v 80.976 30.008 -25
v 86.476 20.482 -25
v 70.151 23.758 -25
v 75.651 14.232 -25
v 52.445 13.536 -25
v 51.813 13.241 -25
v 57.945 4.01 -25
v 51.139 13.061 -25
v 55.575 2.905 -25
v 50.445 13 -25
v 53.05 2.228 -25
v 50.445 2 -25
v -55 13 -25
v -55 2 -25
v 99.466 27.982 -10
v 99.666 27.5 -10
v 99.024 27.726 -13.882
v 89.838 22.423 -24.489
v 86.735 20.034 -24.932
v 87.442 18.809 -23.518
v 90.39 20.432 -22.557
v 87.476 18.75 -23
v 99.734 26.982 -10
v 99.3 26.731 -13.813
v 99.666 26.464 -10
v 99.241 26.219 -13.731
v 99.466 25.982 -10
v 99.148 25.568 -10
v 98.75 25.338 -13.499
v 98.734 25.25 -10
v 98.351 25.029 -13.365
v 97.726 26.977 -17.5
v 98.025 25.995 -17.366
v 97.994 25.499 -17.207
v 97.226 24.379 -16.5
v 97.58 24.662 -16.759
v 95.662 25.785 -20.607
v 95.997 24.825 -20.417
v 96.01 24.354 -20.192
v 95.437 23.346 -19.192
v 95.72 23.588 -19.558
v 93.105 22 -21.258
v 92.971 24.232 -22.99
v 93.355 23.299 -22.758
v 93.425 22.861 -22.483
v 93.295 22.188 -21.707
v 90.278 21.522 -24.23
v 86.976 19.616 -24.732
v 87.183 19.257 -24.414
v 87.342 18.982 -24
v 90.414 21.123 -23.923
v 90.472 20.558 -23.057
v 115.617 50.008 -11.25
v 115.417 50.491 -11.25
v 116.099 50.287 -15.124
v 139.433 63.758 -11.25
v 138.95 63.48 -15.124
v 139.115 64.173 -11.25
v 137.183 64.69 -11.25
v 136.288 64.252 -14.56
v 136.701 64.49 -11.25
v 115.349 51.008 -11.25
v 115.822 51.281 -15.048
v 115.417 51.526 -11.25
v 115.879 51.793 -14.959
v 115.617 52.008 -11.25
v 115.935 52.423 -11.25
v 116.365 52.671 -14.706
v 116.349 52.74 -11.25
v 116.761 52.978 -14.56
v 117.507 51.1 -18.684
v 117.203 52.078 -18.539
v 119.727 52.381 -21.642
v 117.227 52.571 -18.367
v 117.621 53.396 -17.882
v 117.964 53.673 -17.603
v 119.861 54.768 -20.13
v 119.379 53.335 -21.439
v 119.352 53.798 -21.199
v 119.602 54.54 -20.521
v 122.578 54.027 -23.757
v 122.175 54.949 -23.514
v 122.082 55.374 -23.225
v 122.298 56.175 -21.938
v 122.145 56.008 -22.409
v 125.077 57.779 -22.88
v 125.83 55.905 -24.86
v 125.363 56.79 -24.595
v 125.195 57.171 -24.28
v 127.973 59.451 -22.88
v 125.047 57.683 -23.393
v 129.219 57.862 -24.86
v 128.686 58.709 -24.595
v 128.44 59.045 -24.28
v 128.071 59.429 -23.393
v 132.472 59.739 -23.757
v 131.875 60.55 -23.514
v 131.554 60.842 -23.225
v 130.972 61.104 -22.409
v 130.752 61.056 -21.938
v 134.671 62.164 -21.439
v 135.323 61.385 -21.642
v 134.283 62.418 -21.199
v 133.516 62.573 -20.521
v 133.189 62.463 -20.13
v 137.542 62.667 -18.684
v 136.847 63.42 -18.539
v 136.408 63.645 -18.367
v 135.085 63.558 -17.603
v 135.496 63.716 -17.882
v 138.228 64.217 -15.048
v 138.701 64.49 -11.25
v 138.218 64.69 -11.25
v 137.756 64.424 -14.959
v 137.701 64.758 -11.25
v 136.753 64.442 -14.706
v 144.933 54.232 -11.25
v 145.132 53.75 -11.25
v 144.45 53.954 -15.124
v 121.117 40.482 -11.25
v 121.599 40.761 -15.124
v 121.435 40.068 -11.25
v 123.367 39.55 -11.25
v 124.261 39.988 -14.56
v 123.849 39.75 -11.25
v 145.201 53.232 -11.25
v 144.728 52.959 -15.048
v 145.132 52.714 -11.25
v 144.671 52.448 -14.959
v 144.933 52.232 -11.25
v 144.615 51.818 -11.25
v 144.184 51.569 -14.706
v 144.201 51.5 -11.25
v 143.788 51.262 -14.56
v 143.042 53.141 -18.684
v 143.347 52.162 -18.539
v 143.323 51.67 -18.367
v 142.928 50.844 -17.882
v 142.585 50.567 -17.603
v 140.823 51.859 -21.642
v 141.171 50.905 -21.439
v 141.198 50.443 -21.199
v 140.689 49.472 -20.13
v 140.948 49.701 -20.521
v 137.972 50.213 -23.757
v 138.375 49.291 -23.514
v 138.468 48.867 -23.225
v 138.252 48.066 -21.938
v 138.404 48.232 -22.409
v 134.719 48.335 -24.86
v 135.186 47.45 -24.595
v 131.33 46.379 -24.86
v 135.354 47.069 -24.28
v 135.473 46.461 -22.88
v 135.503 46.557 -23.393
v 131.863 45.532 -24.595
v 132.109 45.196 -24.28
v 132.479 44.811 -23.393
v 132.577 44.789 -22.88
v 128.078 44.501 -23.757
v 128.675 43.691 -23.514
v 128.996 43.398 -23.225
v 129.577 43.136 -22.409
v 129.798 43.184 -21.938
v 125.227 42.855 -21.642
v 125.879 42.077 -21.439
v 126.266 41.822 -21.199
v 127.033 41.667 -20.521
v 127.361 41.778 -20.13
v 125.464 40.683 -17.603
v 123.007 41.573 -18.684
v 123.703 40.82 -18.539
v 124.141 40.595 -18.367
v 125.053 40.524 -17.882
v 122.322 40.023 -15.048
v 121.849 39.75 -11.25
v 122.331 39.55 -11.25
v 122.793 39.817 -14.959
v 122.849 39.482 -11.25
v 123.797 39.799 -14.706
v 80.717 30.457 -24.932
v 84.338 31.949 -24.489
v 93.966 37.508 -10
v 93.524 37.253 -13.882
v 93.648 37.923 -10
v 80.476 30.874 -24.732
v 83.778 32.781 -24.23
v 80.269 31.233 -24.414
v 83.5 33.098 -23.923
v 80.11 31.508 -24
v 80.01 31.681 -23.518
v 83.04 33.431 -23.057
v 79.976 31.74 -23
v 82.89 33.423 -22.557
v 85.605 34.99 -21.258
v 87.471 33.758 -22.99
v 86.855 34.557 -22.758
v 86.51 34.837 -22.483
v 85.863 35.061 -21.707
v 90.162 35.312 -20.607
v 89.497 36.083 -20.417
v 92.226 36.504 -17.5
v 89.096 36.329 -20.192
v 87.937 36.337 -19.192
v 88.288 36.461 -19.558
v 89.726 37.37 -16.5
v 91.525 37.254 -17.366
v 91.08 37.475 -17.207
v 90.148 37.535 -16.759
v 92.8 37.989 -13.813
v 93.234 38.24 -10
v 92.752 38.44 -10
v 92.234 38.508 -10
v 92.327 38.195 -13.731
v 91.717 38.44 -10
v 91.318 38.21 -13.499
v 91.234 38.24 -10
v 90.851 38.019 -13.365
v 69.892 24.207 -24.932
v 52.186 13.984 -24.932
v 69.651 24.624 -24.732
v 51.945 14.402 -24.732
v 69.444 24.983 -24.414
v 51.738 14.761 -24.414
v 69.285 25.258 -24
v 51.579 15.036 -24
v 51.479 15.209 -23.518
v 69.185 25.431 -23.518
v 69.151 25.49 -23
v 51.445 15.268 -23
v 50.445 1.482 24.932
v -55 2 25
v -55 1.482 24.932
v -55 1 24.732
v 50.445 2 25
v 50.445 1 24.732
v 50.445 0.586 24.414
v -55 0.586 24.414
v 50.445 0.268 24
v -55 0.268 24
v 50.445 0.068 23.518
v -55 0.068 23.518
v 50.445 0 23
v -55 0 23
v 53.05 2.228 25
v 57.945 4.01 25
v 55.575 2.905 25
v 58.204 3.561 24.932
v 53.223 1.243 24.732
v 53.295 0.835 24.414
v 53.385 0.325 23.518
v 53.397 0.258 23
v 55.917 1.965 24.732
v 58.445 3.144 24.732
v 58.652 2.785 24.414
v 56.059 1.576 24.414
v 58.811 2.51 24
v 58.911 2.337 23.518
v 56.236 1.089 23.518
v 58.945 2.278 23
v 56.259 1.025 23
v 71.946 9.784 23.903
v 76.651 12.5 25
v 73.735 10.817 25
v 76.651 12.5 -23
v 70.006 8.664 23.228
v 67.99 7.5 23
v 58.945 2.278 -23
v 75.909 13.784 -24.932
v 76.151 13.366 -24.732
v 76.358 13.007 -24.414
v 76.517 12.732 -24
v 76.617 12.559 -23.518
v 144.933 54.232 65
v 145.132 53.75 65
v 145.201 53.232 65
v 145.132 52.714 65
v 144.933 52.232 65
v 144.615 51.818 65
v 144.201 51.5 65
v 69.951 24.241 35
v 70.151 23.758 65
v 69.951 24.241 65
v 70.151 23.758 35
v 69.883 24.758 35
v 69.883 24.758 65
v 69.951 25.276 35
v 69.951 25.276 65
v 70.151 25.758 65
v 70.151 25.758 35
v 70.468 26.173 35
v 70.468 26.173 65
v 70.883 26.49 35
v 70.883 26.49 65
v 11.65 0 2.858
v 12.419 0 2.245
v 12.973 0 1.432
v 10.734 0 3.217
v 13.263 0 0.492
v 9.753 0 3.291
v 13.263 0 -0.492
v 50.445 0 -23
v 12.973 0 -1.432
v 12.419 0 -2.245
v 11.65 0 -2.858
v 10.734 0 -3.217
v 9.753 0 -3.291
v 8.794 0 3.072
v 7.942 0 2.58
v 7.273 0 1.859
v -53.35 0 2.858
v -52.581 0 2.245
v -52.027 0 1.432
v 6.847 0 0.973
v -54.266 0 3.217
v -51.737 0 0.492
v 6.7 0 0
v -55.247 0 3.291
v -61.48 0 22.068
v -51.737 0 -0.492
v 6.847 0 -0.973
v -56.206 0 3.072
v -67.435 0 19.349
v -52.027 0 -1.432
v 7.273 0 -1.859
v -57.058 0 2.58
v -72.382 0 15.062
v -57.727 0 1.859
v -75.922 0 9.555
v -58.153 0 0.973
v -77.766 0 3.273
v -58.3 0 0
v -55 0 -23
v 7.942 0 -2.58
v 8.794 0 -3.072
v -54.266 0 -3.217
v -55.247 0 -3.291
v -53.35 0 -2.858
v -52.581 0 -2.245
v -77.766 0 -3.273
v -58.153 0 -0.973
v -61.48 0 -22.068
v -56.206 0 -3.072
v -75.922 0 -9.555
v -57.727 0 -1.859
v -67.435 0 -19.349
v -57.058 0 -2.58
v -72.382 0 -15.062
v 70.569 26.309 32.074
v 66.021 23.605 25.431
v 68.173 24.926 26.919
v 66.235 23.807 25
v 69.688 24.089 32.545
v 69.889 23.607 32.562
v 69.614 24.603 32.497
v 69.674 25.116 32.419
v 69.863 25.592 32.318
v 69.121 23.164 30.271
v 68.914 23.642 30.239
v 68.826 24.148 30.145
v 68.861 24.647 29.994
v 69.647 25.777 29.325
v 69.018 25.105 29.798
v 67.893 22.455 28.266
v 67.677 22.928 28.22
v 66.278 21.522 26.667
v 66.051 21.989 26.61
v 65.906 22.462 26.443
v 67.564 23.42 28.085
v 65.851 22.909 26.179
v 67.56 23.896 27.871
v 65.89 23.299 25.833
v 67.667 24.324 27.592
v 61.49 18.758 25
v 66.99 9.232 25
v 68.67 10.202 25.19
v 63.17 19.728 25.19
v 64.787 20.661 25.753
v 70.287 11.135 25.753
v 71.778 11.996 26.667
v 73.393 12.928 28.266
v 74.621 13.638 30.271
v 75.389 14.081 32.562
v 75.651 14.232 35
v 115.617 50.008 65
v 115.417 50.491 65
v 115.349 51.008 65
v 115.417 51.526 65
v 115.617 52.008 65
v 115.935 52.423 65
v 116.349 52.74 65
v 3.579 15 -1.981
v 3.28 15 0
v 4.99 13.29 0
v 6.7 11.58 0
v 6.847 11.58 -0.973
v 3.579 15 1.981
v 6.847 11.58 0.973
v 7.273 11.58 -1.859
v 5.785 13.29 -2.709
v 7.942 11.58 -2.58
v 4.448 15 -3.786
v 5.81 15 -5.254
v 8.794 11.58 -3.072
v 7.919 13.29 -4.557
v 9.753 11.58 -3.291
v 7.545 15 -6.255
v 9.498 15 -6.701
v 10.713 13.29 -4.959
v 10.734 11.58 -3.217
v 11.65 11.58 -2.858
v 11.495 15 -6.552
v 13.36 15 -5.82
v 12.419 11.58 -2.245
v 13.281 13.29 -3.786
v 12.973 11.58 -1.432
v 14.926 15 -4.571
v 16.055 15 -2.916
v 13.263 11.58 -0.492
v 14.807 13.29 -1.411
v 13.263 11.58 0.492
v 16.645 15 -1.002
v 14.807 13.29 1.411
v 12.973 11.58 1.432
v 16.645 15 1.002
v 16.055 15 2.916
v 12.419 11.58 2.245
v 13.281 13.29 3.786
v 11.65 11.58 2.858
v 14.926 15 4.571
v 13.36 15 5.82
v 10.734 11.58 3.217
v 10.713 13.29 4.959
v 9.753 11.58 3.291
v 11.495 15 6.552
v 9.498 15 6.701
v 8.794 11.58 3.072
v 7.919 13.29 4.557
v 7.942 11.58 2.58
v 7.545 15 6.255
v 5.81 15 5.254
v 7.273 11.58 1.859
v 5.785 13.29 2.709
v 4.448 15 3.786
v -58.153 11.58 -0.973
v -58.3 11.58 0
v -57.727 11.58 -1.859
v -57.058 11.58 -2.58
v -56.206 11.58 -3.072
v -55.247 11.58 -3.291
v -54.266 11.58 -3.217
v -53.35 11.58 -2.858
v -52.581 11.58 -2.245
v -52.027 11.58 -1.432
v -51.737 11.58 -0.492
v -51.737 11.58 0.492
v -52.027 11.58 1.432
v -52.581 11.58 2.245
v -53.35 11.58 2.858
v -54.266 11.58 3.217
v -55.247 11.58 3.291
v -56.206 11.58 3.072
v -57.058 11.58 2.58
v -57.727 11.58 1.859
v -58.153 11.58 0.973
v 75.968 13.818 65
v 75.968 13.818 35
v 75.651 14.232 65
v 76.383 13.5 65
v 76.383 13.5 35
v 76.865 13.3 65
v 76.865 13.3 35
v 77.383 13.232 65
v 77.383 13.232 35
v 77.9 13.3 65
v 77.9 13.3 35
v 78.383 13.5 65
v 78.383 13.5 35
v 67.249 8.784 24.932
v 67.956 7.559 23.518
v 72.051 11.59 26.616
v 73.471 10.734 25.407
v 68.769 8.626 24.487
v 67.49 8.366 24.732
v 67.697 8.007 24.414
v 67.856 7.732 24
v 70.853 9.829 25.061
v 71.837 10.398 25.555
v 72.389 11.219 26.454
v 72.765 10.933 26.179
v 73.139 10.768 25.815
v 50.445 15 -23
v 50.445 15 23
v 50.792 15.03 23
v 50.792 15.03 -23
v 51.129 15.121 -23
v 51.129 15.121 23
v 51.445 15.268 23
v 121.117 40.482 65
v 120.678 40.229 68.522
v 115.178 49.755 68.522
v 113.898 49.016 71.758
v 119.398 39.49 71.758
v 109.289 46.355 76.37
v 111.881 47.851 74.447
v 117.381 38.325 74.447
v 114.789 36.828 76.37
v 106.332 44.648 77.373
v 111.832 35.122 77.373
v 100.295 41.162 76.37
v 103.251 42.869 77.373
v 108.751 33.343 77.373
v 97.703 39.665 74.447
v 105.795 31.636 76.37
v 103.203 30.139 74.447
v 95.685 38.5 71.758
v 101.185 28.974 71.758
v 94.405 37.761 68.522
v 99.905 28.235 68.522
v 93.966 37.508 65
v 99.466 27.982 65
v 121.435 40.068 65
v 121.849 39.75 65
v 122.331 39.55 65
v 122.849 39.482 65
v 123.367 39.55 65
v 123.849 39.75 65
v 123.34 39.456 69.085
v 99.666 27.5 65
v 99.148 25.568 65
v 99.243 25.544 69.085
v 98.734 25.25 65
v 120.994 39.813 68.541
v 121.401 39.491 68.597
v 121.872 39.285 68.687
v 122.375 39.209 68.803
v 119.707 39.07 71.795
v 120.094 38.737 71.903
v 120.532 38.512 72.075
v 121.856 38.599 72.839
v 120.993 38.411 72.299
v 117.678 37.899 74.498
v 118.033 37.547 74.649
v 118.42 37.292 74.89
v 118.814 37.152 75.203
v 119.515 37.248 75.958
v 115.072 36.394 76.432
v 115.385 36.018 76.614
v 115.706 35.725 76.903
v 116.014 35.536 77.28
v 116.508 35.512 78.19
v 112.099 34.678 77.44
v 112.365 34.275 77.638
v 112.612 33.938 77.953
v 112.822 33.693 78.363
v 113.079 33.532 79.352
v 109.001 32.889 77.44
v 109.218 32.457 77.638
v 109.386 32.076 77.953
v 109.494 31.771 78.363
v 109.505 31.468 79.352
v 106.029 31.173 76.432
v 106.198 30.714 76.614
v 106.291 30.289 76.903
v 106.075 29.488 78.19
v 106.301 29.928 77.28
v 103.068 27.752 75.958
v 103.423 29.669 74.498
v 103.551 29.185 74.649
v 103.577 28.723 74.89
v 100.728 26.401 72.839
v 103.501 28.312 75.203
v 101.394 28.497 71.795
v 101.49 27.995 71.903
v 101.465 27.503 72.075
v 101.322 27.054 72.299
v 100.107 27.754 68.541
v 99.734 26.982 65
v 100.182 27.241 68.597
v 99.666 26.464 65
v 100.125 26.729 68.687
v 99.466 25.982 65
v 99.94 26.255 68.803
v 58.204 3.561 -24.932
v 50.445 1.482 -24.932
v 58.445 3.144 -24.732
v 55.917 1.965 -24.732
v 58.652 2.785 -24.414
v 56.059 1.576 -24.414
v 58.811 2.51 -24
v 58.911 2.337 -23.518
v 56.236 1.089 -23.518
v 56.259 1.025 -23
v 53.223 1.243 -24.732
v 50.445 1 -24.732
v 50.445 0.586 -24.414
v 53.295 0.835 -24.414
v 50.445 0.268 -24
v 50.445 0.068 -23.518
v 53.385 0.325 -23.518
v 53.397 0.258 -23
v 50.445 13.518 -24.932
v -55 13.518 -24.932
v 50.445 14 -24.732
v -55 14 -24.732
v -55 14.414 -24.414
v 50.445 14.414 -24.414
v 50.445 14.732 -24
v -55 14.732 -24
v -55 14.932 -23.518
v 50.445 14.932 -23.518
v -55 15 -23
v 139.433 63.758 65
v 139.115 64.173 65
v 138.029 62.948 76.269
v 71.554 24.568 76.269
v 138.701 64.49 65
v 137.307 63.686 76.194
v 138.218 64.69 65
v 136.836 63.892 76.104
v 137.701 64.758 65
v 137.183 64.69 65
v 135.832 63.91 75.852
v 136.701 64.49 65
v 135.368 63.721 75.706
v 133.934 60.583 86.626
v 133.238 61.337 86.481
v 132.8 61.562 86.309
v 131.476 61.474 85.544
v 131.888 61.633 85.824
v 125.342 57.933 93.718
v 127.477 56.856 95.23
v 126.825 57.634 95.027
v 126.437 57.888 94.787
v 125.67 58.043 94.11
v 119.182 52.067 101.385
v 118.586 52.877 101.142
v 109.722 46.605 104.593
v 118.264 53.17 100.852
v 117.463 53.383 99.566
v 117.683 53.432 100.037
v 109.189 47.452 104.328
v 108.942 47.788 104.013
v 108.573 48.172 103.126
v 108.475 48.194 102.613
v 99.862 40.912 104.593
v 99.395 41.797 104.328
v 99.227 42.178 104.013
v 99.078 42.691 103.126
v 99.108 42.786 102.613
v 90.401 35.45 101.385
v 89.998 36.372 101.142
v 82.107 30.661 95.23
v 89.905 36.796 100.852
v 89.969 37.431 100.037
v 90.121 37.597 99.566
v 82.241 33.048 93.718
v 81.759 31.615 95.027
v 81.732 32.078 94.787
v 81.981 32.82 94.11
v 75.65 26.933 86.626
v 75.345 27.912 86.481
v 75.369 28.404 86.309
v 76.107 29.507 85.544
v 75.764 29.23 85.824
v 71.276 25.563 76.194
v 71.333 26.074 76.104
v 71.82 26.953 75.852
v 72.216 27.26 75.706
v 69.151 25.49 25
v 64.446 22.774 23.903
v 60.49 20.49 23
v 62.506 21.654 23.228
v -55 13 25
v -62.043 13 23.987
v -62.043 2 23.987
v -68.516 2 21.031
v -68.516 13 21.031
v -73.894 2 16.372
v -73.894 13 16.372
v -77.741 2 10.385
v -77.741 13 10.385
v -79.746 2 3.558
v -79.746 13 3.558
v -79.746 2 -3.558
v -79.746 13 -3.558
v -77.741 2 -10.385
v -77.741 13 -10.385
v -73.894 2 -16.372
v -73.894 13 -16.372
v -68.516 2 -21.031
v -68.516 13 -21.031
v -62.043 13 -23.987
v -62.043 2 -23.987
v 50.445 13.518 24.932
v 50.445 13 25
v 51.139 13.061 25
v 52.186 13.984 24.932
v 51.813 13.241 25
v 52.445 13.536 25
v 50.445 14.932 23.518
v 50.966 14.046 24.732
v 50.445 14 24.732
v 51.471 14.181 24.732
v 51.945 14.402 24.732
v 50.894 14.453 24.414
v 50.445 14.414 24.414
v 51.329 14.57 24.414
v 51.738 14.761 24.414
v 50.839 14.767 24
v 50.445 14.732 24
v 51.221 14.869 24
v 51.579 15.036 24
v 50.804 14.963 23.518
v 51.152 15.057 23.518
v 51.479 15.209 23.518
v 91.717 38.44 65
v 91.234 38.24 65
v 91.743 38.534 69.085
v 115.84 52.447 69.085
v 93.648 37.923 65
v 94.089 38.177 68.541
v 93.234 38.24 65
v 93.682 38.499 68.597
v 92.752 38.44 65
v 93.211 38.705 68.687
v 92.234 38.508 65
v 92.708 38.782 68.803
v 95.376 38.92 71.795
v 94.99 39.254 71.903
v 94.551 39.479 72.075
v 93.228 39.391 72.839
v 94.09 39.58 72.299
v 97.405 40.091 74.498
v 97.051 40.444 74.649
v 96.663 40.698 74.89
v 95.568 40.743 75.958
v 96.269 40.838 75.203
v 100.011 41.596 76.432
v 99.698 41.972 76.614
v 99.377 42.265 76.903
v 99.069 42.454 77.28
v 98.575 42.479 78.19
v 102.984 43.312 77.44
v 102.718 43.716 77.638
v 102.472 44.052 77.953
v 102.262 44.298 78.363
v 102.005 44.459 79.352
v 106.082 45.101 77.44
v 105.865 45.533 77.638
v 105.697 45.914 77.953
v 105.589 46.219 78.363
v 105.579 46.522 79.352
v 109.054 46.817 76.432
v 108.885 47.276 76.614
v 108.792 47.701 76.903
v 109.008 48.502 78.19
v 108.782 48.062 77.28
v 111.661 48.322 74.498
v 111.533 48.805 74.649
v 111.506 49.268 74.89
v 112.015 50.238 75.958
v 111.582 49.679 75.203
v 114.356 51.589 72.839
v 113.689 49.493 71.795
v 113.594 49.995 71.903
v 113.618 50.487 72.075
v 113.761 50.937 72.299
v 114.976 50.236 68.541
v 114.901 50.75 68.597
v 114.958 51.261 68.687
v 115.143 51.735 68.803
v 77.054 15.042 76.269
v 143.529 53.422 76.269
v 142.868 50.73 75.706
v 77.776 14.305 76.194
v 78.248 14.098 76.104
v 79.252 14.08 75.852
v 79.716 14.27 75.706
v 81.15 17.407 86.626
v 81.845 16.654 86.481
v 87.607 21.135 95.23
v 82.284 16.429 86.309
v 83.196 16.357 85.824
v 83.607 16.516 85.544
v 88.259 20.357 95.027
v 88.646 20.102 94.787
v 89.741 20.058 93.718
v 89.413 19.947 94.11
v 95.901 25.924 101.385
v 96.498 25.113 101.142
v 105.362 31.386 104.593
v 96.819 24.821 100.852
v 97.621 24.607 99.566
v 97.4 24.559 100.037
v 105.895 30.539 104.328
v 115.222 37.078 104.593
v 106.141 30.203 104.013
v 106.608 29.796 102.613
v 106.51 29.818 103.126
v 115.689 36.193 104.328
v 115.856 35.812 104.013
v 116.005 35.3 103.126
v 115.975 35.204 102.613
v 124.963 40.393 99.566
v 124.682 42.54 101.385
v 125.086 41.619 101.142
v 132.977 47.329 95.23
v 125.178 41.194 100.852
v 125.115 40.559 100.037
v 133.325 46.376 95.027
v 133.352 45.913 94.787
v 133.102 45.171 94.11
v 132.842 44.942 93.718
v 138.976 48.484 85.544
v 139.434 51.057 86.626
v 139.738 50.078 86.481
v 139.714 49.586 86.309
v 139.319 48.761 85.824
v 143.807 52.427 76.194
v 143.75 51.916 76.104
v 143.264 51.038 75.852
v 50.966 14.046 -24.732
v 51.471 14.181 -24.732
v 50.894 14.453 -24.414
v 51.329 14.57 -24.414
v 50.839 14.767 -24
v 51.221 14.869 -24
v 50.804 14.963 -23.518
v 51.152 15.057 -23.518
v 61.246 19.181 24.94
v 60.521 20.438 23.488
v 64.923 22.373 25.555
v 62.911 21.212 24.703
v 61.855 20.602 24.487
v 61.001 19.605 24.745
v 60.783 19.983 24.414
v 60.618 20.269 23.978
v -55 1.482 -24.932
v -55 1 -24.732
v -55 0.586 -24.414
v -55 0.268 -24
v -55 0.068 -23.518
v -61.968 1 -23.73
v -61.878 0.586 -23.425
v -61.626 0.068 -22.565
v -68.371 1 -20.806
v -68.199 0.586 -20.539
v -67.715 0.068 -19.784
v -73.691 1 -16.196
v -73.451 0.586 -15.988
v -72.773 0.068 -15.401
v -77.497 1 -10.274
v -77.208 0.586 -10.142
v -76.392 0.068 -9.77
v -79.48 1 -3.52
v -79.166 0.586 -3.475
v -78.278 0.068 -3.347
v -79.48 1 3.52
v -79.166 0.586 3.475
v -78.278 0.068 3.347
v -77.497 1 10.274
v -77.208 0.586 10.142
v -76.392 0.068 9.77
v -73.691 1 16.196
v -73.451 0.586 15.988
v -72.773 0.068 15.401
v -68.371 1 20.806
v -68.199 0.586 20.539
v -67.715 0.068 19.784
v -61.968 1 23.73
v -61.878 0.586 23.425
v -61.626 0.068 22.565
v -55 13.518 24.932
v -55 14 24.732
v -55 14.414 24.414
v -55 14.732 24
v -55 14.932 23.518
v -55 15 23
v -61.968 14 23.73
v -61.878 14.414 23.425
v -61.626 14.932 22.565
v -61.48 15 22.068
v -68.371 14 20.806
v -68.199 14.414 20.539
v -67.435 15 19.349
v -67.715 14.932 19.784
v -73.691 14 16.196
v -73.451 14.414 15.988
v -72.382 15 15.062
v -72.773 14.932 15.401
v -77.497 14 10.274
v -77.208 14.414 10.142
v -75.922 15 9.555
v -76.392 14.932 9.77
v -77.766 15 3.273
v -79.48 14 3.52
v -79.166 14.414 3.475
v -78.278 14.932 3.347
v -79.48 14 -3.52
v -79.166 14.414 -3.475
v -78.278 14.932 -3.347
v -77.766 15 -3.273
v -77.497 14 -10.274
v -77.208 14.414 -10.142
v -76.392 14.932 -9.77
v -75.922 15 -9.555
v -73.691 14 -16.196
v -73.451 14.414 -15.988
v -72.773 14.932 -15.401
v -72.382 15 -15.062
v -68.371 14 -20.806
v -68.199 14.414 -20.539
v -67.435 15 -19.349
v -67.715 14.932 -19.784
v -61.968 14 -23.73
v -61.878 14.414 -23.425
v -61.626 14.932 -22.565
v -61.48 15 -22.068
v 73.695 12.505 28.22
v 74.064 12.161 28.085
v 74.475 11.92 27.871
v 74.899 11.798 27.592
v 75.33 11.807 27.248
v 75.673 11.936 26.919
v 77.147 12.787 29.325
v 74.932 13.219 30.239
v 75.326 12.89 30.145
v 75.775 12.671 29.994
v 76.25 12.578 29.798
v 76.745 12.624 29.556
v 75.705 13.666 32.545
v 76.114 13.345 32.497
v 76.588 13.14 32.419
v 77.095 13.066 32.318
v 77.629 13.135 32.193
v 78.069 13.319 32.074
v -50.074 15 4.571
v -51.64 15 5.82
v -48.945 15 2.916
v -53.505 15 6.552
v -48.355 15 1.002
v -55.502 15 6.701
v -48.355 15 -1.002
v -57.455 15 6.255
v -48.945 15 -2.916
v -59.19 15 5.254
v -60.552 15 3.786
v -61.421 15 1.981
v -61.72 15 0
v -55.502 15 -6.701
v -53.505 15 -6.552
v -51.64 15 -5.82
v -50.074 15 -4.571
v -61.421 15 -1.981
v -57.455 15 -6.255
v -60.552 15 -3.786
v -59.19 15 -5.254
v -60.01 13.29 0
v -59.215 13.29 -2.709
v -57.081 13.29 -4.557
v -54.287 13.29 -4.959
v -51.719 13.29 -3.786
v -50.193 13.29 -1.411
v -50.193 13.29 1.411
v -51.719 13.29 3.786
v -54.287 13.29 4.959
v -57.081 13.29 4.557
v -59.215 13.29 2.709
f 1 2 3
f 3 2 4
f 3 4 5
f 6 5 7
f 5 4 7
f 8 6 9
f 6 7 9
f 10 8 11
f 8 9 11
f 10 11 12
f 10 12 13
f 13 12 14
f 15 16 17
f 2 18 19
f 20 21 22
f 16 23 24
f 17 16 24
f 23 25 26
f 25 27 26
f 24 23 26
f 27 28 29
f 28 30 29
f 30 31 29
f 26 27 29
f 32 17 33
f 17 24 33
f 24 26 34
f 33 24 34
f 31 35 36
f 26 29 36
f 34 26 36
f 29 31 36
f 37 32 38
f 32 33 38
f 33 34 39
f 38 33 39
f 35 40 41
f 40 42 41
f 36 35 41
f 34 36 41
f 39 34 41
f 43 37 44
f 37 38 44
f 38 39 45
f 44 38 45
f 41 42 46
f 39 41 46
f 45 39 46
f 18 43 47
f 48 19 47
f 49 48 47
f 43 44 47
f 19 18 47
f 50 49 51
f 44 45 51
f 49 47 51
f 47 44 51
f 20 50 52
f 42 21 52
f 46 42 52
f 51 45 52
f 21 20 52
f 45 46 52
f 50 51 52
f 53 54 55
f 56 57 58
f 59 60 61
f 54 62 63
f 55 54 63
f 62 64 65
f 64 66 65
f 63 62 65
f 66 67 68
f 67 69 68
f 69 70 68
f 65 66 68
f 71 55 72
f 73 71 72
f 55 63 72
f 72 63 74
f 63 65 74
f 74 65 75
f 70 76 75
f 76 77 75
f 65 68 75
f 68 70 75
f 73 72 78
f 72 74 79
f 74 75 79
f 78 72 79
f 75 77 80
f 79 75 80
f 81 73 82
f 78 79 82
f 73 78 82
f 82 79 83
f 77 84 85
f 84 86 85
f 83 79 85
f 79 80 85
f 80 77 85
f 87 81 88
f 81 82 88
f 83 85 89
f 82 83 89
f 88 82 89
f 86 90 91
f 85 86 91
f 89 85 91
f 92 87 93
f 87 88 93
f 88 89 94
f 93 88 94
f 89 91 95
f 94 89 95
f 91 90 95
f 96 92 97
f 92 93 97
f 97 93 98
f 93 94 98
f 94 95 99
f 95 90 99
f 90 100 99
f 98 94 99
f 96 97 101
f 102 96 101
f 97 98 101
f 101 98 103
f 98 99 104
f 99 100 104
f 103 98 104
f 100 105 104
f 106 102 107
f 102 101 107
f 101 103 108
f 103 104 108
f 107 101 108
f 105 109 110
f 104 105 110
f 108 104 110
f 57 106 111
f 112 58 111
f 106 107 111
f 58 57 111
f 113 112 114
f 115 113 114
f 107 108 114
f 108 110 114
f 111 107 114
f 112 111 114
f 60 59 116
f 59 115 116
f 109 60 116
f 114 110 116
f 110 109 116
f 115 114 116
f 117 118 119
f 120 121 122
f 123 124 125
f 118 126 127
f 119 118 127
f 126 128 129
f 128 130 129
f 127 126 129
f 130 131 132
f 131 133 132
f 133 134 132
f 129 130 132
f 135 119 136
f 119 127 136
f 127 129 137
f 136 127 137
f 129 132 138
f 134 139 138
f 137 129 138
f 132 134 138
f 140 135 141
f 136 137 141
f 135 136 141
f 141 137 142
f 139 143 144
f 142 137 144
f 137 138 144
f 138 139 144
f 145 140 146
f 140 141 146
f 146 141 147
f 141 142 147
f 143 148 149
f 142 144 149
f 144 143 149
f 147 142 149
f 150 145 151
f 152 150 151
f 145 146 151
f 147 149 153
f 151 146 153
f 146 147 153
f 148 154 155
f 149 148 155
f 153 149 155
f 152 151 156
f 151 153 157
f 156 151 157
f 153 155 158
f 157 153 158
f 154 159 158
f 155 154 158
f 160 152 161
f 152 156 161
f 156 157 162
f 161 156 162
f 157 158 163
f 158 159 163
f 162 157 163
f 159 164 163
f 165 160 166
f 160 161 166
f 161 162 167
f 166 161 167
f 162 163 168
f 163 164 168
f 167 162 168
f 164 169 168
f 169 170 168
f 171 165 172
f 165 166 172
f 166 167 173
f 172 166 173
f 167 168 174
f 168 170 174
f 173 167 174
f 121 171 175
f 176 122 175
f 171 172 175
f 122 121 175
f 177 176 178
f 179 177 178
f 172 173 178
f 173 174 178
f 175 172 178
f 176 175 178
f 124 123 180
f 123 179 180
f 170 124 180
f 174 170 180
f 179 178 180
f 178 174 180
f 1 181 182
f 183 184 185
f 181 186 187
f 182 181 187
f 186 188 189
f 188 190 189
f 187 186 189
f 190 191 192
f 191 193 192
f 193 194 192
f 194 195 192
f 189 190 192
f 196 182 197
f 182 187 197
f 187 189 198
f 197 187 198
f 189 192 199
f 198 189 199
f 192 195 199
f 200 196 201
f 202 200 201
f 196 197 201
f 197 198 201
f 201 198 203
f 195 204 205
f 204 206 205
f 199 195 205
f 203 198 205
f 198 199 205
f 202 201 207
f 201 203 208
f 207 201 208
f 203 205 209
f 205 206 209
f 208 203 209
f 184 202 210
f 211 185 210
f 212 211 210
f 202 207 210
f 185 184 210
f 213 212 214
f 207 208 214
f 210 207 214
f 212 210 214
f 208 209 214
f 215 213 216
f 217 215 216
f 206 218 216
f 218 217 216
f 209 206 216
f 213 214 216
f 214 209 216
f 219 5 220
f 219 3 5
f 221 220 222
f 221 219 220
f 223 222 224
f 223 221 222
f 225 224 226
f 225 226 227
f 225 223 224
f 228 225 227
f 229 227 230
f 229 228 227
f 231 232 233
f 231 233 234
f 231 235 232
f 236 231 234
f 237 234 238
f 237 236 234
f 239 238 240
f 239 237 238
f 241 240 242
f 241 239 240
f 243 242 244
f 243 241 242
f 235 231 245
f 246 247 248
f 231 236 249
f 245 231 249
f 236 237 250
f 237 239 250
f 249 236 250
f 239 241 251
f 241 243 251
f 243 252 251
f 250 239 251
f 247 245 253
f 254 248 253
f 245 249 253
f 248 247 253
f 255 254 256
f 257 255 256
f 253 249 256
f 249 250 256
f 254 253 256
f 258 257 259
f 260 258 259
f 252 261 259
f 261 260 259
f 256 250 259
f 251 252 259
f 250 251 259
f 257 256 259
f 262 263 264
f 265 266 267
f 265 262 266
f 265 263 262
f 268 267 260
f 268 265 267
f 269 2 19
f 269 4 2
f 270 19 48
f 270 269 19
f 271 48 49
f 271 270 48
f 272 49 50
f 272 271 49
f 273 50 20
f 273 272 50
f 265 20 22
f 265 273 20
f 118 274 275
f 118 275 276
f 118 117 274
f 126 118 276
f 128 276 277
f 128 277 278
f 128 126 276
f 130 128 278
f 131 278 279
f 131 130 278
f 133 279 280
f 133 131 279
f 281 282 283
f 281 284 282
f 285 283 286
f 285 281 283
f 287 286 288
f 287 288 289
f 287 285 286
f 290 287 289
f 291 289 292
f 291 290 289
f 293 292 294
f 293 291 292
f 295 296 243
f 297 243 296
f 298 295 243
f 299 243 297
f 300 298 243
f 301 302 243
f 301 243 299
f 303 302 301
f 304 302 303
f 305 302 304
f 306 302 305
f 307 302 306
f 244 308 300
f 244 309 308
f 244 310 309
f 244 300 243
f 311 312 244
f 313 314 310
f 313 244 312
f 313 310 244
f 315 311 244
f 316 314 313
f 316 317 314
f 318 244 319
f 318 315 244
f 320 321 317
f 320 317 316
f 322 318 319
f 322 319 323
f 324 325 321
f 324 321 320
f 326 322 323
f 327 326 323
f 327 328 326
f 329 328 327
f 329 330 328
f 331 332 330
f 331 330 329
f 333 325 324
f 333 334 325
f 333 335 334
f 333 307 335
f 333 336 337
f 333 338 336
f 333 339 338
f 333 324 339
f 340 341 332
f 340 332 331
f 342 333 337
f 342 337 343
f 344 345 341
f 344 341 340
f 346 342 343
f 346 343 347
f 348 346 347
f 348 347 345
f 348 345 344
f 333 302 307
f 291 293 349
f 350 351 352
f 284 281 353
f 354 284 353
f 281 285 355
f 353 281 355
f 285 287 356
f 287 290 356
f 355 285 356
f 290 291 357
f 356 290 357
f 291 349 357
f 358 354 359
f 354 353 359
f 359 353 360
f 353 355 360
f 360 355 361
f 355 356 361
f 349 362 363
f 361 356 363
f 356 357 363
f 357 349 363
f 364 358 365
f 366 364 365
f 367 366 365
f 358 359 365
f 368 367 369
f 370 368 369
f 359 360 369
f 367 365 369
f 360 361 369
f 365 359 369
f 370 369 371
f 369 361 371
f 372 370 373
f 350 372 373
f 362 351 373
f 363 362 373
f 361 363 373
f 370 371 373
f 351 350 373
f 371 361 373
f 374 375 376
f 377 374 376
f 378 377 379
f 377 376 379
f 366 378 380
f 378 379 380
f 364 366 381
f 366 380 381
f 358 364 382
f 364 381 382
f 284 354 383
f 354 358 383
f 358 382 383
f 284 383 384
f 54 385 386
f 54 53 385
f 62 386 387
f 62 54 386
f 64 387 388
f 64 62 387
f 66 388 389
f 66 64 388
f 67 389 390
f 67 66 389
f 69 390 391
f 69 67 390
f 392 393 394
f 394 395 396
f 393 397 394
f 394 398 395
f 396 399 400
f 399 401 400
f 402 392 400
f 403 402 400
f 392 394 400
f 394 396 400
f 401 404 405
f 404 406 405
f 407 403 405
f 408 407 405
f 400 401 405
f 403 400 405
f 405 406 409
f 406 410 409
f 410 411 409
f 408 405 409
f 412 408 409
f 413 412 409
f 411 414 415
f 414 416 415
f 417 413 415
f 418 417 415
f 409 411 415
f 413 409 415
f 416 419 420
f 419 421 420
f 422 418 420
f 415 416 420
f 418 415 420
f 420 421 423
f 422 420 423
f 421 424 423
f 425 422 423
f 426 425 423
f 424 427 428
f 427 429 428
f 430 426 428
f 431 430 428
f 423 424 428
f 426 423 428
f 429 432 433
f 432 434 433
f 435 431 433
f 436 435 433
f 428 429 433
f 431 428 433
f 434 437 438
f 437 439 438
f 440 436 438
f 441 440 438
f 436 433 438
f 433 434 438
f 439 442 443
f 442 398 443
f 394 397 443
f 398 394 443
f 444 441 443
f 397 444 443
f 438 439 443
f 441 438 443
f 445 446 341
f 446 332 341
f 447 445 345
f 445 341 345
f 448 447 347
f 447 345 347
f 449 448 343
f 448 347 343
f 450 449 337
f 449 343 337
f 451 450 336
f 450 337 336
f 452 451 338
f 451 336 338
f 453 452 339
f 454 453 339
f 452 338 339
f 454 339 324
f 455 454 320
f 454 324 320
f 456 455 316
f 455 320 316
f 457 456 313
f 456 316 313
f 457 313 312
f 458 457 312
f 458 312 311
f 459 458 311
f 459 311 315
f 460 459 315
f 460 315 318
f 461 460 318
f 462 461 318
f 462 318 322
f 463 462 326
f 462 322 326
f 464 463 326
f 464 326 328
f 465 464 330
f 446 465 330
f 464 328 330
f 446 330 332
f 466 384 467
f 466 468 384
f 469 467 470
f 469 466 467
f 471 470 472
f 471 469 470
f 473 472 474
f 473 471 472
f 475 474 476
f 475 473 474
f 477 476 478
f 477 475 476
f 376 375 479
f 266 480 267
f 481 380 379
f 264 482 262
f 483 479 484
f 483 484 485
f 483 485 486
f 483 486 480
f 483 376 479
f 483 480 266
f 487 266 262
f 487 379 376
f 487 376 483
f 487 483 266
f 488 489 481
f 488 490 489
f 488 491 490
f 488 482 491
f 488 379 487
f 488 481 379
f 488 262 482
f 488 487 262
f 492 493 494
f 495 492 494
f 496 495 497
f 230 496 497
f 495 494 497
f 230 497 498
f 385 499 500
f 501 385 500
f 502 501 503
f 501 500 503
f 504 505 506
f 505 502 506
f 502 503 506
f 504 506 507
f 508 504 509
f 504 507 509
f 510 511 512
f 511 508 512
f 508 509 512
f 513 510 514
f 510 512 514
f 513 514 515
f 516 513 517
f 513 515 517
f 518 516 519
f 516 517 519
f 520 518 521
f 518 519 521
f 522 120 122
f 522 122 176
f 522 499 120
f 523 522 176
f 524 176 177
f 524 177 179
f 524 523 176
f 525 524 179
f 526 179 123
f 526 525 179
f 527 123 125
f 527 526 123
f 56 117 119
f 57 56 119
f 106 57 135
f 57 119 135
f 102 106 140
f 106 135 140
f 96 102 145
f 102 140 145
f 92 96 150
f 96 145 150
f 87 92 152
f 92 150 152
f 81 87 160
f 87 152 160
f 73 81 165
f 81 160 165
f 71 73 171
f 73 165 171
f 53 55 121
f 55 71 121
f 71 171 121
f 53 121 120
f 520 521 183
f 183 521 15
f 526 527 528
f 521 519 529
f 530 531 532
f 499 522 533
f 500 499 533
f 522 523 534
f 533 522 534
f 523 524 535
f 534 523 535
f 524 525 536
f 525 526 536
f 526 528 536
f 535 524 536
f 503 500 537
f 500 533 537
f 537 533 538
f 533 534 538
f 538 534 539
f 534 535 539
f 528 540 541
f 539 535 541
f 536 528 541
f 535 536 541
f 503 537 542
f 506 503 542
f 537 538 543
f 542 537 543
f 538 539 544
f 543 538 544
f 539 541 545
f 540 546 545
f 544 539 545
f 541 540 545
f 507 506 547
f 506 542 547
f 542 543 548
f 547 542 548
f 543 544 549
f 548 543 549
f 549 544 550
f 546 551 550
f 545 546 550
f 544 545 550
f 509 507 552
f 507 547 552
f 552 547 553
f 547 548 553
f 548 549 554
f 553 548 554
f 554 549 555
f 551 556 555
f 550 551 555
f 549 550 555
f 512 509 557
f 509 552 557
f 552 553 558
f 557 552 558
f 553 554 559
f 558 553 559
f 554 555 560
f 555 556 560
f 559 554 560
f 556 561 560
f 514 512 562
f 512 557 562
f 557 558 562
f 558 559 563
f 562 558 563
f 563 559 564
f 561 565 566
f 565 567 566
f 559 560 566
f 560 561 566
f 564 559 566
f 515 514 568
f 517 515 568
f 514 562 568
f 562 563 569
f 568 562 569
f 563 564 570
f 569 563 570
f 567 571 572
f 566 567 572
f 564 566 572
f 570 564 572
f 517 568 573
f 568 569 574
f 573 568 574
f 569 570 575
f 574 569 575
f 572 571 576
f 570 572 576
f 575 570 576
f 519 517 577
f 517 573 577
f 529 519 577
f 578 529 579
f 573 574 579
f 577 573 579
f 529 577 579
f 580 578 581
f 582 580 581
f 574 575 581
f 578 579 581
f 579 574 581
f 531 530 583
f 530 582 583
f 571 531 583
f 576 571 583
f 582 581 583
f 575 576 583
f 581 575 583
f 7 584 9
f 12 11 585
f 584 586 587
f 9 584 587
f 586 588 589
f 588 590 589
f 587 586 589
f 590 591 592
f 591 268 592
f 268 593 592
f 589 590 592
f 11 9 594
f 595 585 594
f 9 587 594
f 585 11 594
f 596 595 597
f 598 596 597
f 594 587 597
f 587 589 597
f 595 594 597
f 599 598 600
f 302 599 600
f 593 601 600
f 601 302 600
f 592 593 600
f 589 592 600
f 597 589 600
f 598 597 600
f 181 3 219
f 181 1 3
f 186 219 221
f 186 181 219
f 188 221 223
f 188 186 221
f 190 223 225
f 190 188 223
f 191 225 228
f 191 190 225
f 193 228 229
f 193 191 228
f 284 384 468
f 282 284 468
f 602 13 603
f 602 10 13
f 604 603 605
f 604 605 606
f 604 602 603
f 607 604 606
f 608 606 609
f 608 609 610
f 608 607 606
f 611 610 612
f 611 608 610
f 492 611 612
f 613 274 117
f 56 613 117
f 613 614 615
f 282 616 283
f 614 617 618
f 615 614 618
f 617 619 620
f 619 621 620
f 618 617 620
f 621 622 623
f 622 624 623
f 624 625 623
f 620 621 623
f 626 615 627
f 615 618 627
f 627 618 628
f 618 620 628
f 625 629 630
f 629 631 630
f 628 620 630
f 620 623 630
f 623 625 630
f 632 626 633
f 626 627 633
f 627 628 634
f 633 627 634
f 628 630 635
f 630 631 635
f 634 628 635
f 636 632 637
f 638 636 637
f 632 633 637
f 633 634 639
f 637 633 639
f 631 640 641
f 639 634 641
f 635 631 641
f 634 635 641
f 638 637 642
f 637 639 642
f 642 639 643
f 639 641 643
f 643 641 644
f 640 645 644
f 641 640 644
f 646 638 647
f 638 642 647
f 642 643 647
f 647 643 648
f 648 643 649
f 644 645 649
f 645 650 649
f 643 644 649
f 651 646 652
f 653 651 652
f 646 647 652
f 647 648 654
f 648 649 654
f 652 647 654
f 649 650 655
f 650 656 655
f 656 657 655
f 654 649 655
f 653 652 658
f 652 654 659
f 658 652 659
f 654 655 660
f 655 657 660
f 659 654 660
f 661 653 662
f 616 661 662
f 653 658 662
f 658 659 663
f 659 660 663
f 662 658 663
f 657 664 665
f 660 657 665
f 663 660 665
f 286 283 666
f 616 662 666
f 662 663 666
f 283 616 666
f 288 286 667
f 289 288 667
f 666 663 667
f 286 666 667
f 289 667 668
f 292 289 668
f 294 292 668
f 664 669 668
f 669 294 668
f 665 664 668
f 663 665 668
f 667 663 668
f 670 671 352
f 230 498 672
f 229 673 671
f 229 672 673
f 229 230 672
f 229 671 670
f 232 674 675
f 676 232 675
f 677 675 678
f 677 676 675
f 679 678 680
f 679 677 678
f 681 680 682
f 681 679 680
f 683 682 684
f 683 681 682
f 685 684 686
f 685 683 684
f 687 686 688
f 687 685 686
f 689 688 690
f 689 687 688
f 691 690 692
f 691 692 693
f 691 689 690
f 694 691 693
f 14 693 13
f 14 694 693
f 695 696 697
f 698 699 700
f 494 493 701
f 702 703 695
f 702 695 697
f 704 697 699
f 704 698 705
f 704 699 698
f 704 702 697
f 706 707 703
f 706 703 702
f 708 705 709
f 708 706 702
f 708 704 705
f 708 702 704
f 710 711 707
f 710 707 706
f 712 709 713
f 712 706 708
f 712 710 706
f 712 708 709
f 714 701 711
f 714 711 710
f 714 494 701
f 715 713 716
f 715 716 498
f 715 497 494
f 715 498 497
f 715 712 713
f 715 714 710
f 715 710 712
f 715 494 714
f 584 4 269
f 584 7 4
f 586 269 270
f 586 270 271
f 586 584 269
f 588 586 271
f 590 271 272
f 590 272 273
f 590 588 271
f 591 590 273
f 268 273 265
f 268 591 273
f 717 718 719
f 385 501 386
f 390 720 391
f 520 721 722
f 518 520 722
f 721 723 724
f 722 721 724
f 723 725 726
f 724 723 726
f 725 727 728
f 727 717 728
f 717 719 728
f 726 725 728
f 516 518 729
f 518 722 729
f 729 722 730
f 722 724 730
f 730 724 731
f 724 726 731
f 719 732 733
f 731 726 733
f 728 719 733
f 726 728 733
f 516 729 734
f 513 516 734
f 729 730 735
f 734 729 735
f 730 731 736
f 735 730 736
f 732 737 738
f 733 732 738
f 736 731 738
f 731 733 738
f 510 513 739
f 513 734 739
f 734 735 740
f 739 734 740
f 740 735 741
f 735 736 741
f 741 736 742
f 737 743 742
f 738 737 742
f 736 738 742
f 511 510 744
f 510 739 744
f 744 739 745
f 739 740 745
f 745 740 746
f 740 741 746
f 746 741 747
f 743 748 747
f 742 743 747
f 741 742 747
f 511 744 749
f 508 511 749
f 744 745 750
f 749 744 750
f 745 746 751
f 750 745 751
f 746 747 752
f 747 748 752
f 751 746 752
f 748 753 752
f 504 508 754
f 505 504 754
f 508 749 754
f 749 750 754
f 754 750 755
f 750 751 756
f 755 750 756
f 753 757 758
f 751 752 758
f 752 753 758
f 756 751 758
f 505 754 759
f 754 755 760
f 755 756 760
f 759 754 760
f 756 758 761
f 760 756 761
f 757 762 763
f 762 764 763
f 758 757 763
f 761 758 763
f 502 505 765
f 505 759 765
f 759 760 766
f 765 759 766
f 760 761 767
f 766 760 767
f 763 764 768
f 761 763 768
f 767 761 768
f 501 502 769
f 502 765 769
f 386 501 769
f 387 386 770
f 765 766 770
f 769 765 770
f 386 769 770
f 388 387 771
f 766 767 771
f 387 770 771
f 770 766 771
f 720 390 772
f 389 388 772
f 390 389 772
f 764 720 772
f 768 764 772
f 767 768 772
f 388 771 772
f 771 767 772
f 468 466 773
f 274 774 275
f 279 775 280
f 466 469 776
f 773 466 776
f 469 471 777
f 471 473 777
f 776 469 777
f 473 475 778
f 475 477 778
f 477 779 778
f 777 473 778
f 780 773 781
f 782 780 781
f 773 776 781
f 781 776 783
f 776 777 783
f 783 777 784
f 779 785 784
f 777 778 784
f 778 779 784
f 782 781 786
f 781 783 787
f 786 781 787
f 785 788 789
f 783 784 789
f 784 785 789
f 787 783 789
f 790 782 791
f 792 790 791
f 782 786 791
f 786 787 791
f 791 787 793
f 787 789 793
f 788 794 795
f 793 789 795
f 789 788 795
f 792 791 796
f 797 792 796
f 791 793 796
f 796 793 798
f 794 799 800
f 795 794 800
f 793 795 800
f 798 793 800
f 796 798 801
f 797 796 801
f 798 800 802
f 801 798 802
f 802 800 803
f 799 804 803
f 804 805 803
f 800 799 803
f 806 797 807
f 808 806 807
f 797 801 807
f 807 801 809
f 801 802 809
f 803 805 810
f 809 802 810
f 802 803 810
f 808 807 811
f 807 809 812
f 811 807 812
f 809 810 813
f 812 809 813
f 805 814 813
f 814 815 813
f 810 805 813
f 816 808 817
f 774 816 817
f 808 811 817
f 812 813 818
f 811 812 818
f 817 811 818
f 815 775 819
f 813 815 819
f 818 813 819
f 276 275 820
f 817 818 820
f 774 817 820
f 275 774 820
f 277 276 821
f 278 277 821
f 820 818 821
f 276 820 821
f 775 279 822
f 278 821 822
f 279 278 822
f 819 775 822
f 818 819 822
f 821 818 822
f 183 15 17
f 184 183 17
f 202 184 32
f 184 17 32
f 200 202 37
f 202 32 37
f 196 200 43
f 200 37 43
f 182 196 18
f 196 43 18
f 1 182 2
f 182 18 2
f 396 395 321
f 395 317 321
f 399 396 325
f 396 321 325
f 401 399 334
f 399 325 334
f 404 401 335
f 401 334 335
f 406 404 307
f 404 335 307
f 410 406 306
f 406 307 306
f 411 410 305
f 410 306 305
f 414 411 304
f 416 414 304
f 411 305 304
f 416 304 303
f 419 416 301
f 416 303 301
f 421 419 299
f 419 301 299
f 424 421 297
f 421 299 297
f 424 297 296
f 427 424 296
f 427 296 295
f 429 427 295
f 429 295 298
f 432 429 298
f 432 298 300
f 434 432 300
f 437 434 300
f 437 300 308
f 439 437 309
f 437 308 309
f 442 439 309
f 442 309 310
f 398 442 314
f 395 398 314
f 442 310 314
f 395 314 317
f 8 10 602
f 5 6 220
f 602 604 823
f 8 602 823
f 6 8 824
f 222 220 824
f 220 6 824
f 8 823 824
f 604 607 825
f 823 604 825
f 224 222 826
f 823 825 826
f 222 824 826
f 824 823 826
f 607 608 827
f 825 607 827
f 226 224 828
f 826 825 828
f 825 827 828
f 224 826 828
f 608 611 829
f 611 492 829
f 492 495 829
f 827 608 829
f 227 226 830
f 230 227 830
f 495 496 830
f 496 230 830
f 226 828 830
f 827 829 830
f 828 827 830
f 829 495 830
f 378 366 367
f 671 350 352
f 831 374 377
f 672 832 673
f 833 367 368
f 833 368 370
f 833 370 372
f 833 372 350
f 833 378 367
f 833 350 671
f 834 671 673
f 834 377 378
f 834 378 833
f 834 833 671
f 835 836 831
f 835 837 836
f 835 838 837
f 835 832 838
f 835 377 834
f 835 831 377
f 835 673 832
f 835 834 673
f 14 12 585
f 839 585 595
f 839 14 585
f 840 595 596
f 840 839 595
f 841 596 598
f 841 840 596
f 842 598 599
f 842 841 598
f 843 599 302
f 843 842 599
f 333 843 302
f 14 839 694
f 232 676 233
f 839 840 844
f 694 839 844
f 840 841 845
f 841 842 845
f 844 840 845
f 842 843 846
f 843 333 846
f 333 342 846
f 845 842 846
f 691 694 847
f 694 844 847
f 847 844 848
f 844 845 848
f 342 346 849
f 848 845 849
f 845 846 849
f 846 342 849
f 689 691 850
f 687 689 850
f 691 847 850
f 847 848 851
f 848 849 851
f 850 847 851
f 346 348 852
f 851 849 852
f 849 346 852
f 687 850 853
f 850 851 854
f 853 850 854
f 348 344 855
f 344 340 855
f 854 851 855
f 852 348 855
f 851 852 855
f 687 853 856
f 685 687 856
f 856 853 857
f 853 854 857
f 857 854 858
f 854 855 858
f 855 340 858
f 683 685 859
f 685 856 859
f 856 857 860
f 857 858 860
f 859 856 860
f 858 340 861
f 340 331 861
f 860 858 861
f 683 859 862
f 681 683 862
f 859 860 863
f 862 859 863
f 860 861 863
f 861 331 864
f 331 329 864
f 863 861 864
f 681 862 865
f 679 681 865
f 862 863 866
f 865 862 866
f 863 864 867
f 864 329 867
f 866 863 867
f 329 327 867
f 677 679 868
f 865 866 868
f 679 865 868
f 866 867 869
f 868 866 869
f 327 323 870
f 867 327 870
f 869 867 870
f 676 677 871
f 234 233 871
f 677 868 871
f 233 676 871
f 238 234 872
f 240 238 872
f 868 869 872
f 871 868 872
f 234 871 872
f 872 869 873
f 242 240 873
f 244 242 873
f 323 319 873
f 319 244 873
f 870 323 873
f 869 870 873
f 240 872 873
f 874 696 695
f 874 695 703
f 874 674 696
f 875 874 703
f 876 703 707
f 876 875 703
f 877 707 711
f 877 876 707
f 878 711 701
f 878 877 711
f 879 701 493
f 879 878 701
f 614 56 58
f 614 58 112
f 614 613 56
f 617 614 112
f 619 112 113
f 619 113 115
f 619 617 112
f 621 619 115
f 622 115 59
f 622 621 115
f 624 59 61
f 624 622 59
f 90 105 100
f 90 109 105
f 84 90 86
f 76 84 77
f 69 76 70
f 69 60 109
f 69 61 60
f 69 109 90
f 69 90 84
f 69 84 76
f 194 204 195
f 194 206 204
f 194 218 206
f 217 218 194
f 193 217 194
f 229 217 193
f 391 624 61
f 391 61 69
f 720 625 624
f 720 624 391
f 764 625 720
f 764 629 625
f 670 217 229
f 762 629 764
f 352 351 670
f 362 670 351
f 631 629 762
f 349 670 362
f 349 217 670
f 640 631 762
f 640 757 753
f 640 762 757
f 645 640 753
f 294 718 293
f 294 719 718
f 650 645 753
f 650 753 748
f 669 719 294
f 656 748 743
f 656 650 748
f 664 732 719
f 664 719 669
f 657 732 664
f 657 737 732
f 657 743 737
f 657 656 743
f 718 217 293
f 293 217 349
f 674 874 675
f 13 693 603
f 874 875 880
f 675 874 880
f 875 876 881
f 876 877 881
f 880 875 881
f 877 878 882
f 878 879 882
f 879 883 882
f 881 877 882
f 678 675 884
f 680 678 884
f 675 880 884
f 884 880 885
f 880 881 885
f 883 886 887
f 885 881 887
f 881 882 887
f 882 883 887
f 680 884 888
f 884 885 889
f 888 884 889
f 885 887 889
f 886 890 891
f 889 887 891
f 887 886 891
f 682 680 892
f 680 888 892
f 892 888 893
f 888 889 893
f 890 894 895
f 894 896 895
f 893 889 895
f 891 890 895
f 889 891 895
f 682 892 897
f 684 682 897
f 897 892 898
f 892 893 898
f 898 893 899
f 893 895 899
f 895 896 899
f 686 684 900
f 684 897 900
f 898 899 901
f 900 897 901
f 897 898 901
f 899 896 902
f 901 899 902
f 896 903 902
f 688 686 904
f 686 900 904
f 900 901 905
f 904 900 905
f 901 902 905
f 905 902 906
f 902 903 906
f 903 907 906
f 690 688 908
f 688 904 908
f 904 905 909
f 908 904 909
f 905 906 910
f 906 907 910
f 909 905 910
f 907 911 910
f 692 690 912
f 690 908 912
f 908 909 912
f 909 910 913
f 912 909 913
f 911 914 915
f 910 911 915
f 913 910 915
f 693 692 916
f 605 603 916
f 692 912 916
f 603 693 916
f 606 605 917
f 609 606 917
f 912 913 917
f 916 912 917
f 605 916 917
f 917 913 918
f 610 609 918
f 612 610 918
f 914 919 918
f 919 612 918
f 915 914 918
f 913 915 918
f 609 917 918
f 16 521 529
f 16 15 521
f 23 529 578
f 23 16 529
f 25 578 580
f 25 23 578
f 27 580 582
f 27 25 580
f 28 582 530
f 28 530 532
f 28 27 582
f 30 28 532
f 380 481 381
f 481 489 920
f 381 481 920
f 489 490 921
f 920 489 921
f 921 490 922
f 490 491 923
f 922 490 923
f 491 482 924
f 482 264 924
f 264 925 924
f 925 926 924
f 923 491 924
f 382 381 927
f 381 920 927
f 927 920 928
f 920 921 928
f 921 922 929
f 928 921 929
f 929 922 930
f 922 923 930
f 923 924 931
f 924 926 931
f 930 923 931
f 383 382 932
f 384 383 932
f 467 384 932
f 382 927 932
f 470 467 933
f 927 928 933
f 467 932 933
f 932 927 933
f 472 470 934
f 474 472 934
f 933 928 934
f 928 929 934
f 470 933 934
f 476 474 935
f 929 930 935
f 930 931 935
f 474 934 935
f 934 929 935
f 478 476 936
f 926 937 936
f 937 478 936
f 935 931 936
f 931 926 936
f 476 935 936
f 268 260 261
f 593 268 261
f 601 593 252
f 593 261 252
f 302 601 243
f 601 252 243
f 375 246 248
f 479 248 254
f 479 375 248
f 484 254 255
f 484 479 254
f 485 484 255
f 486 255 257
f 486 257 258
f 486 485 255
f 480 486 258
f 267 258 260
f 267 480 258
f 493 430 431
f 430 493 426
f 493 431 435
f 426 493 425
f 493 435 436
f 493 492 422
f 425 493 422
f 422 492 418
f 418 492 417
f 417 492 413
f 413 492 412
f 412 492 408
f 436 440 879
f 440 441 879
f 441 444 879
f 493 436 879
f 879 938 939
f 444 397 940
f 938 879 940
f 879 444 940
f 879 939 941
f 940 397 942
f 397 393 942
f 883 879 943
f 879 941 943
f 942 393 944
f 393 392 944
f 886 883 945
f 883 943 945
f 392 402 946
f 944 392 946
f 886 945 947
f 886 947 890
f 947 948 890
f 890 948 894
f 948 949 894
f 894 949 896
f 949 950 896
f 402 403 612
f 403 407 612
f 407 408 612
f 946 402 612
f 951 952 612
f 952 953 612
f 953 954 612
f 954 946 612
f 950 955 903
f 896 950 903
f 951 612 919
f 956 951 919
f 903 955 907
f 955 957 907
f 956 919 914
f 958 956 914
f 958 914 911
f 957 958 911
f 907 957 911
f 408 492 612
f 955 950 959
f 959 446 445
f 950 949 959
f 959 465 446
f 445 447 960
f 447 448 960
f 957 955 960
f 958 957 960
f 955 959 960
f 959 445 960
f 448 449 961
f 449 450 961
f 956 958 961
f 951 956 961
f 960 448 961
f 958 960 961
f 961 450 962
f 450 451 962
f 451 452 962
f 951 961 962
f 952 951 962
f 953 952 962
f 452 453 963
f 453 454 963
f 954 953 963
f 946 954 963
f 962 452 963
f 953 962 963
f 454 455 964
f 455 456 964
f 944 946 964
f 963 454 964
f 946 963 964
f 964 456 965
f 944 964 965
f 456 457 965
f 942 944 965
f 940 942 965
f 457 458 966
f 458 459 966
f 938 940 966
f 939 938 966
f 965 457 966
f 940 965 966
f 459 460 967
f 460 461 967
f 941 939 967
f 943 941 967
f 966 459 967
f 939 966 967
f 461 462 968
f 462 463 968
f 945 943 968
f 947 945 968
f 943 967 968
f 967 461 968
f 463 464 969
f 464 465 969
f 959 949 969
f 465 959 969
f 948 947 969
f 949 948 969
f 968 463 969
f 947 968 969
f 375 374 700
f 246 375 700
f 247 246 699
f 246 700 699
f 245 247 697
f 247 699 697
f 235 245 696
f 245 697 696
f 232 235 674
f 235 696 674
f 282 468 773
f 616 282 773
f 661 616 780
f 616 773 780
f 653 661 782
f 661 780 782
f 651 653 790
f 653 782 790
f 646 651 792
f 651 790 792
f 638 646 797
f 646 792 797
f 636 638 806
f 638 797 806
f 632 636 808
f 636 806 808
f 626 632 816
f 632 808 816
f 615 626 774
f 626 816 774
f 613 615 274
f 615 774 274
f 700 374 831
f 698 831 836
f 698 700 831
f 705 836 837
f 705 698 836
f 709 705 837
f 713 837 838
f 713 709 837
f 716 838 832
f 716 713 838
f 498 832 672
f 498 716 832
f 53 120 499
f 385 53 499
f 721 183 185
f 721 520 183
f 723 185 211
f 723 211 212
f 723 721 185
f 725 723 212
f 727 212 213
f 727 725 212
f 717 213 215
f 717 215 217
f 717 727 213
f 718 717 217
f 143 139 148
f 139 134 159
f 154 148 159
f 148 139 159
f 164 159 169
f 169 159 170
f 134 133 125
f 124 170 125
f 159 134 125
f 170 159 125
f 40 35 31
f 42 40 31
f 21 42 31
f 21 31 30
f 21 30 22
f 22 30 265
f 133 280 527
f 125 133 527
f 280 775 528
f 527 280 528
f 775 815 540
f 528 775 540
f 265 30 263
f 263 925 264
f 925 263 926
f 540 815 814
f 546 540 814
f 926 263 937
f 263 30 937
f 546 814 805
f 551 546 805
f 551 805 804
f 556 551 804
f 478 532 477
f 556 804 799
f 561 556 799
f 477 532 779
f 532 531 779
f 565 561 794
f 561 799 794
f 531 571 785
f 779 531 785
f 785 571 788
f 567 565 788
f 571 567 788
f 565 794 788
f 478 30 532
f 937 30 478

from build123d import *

# Parameters (mm, degrees)
BOSS_EXTRUDE1_DEPTH                             = 15
BOSS_EXTRUDE2_DEPTH                             = 50
BOSS_EXTRUDE3_DEPTH                             = 15
CSK_FOR_M5_FLAT_HEAD_MACHINE_SCREW1_D           = 6.6
CSK_FOR_M5_FLAT_HEAD_MACHINE_SCREW1_CSINK_D     = 13.44
CSK_FOR_M5_FLAT_HEAD_MACHINE_SCREW1_CSINK_ANGLE = 90
FILLET1_R                                       = 17
FILLET2_R                                       = 2


with BuildPart() as part:
    # Sketch1 → Boss-Extrude1 (new body)
    with BuildSketch(Plane(origin=(0, 0, 0), x_dir=(1, 0, 0), z_dir=(0, 1, 0))):
        with BuildLine():
            Line((-55, 25), (55, 25))
            Line((55, 25), (55, -25))
            Line((55, -25), (-55, -25))
            ThreePointArc((-55, -25), (-80, 0), (-55, 25))
        make_face()
    extrude(amount=BOSS_EXTRUDE1_DEPTH)

    # Sketch2 → Boss-Extrude2 (add)
    with BuildSketch(Plane(origin=(0, 0, -25), x_dir=(-1, 0, 0), z_dir=(0, 0, -1))):
        Polygon((-76.650635095, 12.5), (-55, 0), (-50.980762114, 15), (-69.150635095, 25.490381057), align=None)
    extrude(amount=-BOSS_EXTRUDE2_DEPTH)

    # Sketch3 → Boss-Extrude3 (add)
    with BuildSketch(Plane(origin=(13.75, -23.815698604, 0), x_dir=(0.8660254037844378, 0.5000000000000017, 0), z_dir=(0.5000000000000016, -0.8660254037844377, 0))):
        with BuildLine():
            Line((100.131397208, 65), (100.131397208, -10))
            ThreePointArc((100.131397208, -10), (95.737998926, -20.606601718), (85.131397208, -25))
            Line((85.131397208, -25), (62.631397208, -25))
            Line((62.631397208, -25), (62.631397208, 25))
            ThreePointArc((62.631397208, 25), (69.70246502, 27.928932188), (72.631397208, 35))
            Line((72.631397208, 35), (72.631397208, 65))
            ThreePointArc((72.631397208, 65), (112.631397208, 105), (152.631397208, 65))
            Line((152.631397208, 65), (152.631397208, -11.25))
            ThreePointArc((152.631397208, -11.25), (138.881397208, -25), (125.131397208, -11.25))
            Line((125.131397208, -11.25), (125.131397208, 65))
            ThreePointArc((125.131397208, 65), (112.631397208, 77.5), (100.131397208, 65))
        make_face()
    extrude(amount=-BOSS_EXTRUDE3_DEPTH)

    # CSK for M5 Flat Head Machine Screw1 (through all)
    with Locations(Plane(origin=(0, 15, 0), x_dir=(1, 0, 0), z_dir=(0, 1, 0))):
        with Locations((-55, 0), (10, 0)):
            CounterSinkHole(CSK_FOR_M5_FLAT_HEAD_MACHINE_SCREW1_D / 2, CSK_FOR_M5_FLAT_HEAD_MACHINE_SCREW1_CSINK_D / 2, counter_sink_angle=CSK_FOR_M5_FLAT_HEAD_MACHINE_SCREW1_CSINK_ANGLE)

    # Fillet1
    fillet1_edges = [part.edges().sort_by_distance(p)[0] for p in [
        (55, 0, 0),
    ]]
    fillet(fillet1_edges, radius=FILLET1_R)

    # Fillet2
    fillet2_edges = [part.edges().sort_by_distance(p)[0] for p in [
        (-80, 15, 0),
        (-2.009618943, 15, -25),
        (-2.009618943, 15, 25),
        (65.478357378, 23.370190528, -25),
        (73.210408185, 10.513784068, -25),
        (50.980762114, 15, 0),
        (55.735571585, 17.745190528, 25),
        (74.114105414, 11.035533906, 27.928932188),
        (96.661539177, 24.053300859, -20.606601718),
        (100.466333699, 26.25, 27.5),
        (111.291651246, 32.5, 77.5),
        (122.116968793, 38.75, 26.875),
        (134.024818095, 45.625, -25),
        (145.932667397, 52.5, 26.875),
        (111.291651246, 32.5, 105),
        (76.650635095, 12.5, 50),
        (89.161539177, 37.043681916, -20.606601718),
        (66.614105414, 24.025914963, 27.928932188),
        (69.150635095, 25.490381057, 50),
        (103.791651246, 45.490381057, 105),
        (138.432667397, 65.490381057, 26.875),
        (126.524818095, 58.615381057, -25),
        (114.616968793, 51.740381057, 26.875),
        (103.791651246, 45.490381057, 77.5),
        (92.966333699, 39.240381057, 27.5),
        (-2.277568136, 0, 25),
        (-80, 0, 0),
        (63.467622393, 4.888784068, 25),
        (-2.277568136, 0, -25),
        (54.844787495, 0.579260953, -25),
        (54.844787495, 0.579260953, 25),
    ]]
    fillet(fillet2_edges, radius=FILLET2_R)


solid = part.part
